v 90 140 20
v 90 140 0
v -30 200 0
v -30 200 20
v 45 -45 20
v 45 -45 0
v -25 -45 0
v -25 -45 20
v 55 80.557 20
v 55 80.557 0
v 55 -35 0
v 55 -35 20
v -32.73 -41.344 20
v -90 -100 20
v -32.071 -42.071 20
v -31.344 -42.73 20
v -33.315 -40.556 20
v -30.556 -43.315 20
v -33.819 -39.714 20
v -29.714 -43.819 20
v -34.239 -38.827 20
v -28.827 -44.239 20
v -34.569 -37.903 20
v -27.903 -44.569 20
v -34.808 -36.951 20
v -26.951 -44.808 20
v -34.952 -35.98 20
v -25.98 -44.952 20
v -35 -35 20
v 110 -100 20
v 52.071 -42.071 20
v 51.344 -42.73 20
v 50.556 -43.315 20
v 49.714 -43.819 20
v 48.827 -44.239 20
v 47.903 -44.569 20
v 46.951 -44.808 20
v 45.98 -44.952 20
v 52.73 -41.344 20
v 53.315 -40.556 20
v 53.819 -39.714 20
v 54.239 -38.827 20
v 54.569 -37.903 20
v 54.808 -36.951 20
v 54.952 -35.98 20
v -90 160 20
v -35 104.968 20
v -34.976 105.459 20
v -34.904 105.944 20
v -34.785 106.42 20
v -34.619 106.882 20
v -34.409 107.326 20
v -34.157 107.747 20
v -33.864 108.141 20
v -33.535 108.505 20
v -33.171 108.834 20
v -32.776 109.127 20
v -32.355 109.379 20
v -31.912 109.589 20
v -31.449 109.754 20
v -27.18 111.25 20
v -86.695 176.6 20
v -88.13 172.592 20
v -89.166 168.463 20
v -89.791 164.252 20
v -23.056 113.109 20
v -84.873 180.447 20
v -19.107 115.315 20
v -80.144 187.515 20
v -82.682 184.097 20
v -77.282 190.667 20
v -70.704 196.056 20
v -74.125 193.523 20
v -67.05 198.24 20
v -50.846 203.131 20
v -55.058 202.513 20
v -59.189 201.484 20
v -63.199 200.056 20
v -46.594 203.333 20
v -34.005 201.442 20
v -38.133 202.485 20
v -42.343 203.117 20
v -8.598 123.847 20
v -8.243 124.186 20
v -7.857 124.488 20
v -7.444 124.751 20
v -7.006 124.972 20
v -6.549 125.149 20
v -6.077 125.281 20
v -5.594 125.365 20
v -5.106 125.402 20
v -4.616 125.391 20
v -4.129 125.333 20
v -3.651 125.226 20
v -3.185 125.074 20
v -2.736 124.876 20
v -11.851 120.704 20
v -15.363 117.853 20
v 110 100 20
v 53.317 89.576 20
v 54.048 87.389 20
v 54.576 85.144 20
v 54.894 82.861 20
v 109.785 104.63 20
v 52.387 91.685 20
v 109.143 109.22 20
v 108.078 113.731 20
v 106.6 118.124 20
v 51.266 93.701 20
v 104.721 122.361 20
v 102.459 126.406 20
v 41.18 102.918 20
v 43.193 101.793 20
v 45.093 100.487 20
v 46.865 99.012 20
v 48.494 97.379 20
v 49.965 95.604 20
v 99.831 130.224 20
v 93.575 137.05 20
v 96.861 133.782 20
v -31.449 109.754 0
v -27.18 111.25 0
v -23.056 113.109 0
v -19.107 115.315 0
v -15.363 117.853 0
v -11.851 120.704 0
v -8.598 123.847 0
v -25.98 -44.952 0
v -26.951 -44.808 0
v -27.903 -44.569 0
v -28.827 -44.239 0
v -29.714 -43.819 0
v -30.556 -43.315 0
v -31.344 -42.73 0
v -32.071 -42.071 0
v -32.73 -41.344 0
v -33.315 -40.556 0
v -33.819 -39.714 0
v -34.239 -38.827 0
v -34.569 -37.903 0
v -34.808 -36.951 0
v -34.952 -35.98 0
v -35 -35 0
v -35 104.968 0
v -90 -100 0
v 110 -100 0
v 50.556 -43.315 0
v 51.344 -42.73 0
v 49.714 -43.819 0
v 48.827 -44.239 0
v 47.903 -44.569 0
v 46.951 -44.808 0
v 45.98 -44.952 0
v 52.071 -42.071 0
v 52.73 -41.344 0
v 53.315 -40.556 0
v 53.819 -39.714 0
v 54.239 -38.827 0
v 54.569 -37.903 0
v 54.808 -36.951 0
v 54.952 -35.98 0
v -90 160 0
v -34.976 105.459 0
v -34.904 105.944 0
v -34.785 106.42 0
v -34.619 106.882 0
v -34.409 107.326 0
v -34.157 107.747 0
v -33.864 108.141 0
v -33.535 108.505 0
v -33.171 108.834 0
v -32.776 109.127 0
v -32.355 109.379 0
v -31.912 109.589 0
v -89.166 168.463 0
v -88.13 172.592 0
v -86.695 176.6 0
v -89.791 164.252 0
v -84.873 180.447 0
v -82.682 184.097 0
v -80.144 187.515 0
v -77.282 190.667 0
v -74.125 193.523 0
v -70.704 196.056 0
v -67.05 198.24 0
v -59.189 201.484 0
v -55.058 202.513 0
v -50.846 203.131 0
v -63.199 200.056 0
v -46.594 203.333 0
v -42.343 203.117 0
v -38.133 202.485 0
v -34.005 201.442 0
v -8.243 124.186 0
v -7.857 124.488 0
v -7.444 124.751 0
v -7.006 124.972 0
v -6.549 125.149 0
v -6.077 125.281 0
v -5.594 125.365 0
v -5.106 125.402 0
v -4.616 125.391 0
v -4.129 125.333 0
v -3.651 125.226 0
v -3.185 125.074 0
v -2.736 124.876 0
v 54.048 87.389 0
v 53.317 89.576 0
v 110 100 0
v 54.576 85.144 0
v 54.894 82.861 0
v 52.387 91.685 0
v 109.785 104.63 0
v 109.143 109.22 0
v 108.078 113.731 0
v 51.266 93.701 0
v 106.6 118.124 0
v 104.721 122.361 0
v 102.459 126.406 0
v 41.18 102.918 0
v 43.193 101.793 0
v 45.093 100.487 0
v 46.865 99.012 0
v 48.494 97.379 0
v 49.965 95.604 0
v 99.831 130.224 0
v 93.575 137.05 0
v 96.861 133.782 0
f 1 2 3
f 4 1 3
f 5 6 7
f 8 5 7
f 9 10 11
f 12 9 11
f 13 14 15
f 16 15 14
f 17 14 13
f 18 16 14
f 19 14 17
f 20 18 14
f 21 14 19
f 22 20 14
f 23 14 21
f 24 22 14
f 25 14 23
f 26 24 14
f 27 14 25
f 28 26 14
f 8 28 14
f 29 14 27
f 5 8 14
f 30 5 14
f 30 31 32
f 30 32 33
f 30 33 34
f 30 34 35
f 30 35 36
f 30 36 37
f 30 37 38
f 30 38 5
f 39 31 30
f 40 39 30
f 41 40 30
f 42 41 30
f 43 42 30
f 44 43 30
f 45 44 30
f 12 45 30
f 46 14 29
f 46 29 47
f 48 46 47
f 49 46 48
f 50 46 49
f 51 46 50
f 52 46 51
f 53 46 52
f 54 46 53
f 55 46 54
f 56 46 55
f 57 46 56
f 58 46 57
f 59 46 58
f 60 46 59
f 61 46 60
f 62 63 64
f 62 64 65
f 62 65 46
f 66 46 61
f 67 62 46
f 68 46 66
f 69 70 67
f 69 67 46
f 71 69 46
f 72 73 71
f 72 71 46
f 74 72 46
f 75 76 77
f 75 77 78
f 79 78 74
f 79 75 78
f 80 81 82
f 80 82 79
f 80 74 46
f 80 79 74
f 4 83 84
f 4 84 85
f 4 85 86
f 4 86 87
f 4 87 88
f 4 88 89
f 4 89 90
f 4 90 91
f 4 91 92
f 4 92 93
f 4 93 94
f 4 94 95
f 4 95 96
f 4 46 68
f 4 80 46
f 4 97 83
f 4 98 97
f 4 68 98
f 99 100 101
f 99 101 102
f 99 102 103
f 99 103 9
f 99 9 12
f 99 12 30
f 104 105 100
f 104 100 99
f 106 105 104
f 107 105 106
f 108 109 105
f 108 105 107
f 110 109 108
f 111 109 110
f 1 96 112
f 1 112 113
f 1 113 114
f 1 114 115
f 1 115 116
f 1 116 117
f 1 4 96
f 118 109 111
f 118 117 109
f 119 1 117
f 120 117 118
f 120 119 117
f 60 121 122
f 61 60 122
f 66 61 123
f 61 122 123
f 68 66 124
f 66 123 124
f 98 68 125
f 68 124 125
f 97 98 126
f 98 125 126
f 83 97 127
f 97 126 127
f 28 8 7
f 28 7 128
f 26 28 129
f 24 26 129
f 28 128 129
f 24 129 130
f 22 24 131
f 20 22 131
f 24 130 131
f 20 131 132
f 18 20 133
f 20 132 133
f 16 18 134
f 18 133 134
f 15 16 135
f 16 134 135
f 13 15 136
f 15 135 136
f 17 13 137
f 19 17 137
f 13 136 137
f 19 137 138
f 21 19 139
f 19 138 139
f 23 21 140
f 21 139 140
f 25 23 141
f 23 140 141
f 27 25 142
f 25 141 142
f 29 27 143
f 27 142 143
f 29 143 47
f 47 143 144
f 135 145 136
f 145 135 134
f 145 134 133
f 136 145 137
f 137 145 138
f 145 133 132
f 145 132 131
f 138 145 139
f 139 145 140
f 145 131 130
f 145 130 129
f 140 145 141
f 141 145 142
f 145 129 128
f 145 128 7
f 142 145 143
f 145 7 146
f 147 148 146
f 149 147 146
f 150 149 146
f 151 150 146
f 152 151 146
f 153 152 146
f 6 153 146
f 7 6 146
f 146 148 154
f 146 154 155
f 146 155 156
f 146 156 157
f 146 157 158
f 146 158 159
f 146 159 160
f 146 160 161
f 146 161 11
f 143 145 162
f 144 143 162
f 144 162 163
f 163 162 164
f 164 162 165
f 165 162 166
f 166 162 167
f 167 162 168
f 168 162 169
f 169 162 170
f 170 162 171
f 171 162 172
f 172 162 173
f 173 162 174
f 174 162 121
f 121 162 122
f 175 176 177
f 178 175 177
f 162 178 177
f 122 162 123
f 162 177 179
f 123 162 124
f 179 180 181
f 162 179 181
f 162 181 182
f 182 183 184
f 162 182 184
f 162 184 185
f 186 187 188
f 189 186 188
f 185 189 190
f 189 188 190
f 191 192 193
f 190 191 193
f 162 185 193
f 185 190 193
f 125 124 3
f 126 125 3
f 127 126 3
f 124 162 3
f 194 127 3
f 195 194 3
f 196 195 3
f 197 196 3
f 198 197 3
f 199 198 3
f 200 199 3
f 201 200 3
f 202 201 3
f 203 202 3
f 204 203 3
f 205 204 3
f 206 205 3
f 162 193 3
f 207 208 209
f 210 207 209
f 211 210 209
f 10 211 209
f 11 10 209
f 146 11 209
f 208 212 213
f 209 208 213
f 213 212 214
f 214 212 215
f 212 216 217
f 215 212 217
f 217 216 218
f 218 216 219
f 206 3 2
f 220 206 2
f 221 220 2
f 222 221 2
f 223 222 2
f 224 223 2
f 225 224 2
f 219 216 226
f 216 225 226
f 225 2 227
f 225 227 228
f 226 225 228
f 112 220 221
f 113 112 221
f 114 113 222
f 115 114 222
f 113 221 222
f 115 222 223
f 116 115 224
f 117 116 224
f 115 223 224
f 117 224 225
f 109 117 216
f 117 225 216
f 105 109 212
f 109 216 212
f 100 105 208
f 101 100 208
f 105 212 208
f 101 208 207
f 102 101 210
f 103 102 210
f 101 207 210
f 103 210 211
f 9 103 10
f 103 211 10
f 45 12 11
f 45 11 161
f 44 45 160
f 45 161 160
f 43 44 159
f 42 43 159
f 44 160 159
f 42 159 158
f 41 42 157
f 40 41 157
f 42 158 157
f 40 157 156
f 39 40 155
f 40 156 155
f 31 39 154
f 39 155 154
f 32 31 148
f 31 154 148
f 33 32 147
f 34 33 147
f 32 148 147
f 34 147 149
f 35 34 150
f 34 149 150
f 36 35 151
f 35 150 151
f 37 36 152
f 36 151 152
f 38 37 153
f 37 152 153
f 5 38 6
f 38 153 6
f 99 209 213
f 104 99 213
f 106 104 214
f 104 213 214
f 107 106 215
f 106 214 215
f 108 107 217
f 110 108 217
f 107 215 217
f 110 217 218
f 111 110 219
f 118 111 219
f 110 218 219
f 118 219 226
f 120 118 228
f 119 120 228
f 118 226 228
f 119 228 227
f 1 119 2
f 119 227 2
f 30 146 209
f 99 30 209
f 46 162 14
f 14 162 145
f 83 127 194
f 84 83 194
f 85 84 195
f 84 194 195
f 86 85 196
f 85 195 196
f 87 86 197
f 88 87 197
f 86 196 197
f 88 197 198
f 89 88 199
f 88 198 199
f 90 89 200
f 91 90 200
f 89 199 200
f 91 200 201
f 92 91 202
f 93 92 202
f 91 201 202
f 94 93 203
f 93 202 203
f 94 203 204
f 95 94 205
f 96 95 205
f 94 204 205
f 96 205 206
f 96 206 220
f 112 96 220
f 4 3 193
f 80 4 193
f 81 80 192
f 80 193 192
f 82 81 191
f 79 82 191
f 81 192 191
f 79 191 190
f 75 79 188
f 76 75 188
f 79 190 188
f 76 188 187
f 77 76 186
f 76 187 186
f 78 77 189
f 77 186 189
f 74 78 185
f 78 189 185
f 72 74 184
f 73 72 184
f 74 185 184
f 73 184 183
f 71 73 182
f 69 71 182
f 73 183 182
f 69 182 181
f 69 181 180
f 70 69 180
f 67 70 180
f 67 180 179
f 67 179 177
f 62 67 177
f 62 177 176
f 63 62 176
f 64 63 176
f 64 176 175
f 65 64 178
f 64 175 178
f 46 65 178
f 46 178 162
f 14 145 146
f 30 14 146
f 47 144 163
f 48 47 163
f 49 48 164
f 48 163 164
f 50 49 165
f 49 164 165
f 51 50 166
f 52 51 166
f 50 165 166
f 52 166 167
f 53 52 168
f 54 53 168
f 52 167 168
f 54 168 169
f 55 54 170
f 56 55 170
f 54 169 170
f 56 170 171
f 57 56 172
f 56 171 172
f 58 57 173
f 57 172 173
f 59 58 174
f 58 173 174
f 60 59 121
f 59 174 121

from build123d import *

# Parameters (mm, degrees)
BASE_EXTRUDE_DEPTH = 20
CUT_EXTRUDE2_DEPTH = 233.044057119


with BuildPart() as part:
    # Sketch1 → Base-Extrude (new body)
    with BuildSketch(Plane.XY):
        with BuildLine():
            Line((-90, -100), (110, -100))
            Line((110, -100), (110, 100))
            ThreePointArc((110, 100), (104.72135955, 122.360679775), (90, 140))
            Line((90, 140), (-30, 200))
            ThreePointArc((-30, 200), (-70.70367517, 196.055512755), (-90, 160))
            Line((-90, 160), (-90, -100))
        make_face()
    extrude(amount=BASE_EXTRUDE_DEPTH)

    # Sketch3 → Cut-Extrude2 (cut, through all)
    with BuildSketch(Plane(origin=(0, 0, 0), x_dir=(-1, 0, 0), z_dir=(0, 0, -1))):
        with BuildLine():
            Line((2.736269939, 124.876265588), (-41.180339887, 102.917960675))
            ThreePointArc((-41.180339887, 102.917960675), (-51.266270209, 93.700558703), (-55, 80.5572809))
            Line((-55, 80.5572809), (-55, -35))
            ThreePointArc((-55, -35), (-52.071067812, -42.071067812), (-45, -45))
            Line((-45, -45), (25, -45))
            ThreePointArc((25, -45), (32.071067812, -42.071067812), (35, -35))
            Line((35, -35), (35, 104.968443396))
            ThreePointArc((35, 104.968443396), (34.015369025, 107.947841254), (31.449275362, 109.753796144))
            ThreePointArc((31.449275362, 109.753796144), (19.107472836, 115.315093875), (8.597931721, 123.847248796))
            ThreePointArc((8.597931721, 123.847248796), (5.836869232, 125.328821056), (2.736269939, 124.876265588))
        make_face()
    extrude(amount=-CUT_EXTRUDE2_DEPTH, mode=Mode.SUBTRACT)


solid = part.part
